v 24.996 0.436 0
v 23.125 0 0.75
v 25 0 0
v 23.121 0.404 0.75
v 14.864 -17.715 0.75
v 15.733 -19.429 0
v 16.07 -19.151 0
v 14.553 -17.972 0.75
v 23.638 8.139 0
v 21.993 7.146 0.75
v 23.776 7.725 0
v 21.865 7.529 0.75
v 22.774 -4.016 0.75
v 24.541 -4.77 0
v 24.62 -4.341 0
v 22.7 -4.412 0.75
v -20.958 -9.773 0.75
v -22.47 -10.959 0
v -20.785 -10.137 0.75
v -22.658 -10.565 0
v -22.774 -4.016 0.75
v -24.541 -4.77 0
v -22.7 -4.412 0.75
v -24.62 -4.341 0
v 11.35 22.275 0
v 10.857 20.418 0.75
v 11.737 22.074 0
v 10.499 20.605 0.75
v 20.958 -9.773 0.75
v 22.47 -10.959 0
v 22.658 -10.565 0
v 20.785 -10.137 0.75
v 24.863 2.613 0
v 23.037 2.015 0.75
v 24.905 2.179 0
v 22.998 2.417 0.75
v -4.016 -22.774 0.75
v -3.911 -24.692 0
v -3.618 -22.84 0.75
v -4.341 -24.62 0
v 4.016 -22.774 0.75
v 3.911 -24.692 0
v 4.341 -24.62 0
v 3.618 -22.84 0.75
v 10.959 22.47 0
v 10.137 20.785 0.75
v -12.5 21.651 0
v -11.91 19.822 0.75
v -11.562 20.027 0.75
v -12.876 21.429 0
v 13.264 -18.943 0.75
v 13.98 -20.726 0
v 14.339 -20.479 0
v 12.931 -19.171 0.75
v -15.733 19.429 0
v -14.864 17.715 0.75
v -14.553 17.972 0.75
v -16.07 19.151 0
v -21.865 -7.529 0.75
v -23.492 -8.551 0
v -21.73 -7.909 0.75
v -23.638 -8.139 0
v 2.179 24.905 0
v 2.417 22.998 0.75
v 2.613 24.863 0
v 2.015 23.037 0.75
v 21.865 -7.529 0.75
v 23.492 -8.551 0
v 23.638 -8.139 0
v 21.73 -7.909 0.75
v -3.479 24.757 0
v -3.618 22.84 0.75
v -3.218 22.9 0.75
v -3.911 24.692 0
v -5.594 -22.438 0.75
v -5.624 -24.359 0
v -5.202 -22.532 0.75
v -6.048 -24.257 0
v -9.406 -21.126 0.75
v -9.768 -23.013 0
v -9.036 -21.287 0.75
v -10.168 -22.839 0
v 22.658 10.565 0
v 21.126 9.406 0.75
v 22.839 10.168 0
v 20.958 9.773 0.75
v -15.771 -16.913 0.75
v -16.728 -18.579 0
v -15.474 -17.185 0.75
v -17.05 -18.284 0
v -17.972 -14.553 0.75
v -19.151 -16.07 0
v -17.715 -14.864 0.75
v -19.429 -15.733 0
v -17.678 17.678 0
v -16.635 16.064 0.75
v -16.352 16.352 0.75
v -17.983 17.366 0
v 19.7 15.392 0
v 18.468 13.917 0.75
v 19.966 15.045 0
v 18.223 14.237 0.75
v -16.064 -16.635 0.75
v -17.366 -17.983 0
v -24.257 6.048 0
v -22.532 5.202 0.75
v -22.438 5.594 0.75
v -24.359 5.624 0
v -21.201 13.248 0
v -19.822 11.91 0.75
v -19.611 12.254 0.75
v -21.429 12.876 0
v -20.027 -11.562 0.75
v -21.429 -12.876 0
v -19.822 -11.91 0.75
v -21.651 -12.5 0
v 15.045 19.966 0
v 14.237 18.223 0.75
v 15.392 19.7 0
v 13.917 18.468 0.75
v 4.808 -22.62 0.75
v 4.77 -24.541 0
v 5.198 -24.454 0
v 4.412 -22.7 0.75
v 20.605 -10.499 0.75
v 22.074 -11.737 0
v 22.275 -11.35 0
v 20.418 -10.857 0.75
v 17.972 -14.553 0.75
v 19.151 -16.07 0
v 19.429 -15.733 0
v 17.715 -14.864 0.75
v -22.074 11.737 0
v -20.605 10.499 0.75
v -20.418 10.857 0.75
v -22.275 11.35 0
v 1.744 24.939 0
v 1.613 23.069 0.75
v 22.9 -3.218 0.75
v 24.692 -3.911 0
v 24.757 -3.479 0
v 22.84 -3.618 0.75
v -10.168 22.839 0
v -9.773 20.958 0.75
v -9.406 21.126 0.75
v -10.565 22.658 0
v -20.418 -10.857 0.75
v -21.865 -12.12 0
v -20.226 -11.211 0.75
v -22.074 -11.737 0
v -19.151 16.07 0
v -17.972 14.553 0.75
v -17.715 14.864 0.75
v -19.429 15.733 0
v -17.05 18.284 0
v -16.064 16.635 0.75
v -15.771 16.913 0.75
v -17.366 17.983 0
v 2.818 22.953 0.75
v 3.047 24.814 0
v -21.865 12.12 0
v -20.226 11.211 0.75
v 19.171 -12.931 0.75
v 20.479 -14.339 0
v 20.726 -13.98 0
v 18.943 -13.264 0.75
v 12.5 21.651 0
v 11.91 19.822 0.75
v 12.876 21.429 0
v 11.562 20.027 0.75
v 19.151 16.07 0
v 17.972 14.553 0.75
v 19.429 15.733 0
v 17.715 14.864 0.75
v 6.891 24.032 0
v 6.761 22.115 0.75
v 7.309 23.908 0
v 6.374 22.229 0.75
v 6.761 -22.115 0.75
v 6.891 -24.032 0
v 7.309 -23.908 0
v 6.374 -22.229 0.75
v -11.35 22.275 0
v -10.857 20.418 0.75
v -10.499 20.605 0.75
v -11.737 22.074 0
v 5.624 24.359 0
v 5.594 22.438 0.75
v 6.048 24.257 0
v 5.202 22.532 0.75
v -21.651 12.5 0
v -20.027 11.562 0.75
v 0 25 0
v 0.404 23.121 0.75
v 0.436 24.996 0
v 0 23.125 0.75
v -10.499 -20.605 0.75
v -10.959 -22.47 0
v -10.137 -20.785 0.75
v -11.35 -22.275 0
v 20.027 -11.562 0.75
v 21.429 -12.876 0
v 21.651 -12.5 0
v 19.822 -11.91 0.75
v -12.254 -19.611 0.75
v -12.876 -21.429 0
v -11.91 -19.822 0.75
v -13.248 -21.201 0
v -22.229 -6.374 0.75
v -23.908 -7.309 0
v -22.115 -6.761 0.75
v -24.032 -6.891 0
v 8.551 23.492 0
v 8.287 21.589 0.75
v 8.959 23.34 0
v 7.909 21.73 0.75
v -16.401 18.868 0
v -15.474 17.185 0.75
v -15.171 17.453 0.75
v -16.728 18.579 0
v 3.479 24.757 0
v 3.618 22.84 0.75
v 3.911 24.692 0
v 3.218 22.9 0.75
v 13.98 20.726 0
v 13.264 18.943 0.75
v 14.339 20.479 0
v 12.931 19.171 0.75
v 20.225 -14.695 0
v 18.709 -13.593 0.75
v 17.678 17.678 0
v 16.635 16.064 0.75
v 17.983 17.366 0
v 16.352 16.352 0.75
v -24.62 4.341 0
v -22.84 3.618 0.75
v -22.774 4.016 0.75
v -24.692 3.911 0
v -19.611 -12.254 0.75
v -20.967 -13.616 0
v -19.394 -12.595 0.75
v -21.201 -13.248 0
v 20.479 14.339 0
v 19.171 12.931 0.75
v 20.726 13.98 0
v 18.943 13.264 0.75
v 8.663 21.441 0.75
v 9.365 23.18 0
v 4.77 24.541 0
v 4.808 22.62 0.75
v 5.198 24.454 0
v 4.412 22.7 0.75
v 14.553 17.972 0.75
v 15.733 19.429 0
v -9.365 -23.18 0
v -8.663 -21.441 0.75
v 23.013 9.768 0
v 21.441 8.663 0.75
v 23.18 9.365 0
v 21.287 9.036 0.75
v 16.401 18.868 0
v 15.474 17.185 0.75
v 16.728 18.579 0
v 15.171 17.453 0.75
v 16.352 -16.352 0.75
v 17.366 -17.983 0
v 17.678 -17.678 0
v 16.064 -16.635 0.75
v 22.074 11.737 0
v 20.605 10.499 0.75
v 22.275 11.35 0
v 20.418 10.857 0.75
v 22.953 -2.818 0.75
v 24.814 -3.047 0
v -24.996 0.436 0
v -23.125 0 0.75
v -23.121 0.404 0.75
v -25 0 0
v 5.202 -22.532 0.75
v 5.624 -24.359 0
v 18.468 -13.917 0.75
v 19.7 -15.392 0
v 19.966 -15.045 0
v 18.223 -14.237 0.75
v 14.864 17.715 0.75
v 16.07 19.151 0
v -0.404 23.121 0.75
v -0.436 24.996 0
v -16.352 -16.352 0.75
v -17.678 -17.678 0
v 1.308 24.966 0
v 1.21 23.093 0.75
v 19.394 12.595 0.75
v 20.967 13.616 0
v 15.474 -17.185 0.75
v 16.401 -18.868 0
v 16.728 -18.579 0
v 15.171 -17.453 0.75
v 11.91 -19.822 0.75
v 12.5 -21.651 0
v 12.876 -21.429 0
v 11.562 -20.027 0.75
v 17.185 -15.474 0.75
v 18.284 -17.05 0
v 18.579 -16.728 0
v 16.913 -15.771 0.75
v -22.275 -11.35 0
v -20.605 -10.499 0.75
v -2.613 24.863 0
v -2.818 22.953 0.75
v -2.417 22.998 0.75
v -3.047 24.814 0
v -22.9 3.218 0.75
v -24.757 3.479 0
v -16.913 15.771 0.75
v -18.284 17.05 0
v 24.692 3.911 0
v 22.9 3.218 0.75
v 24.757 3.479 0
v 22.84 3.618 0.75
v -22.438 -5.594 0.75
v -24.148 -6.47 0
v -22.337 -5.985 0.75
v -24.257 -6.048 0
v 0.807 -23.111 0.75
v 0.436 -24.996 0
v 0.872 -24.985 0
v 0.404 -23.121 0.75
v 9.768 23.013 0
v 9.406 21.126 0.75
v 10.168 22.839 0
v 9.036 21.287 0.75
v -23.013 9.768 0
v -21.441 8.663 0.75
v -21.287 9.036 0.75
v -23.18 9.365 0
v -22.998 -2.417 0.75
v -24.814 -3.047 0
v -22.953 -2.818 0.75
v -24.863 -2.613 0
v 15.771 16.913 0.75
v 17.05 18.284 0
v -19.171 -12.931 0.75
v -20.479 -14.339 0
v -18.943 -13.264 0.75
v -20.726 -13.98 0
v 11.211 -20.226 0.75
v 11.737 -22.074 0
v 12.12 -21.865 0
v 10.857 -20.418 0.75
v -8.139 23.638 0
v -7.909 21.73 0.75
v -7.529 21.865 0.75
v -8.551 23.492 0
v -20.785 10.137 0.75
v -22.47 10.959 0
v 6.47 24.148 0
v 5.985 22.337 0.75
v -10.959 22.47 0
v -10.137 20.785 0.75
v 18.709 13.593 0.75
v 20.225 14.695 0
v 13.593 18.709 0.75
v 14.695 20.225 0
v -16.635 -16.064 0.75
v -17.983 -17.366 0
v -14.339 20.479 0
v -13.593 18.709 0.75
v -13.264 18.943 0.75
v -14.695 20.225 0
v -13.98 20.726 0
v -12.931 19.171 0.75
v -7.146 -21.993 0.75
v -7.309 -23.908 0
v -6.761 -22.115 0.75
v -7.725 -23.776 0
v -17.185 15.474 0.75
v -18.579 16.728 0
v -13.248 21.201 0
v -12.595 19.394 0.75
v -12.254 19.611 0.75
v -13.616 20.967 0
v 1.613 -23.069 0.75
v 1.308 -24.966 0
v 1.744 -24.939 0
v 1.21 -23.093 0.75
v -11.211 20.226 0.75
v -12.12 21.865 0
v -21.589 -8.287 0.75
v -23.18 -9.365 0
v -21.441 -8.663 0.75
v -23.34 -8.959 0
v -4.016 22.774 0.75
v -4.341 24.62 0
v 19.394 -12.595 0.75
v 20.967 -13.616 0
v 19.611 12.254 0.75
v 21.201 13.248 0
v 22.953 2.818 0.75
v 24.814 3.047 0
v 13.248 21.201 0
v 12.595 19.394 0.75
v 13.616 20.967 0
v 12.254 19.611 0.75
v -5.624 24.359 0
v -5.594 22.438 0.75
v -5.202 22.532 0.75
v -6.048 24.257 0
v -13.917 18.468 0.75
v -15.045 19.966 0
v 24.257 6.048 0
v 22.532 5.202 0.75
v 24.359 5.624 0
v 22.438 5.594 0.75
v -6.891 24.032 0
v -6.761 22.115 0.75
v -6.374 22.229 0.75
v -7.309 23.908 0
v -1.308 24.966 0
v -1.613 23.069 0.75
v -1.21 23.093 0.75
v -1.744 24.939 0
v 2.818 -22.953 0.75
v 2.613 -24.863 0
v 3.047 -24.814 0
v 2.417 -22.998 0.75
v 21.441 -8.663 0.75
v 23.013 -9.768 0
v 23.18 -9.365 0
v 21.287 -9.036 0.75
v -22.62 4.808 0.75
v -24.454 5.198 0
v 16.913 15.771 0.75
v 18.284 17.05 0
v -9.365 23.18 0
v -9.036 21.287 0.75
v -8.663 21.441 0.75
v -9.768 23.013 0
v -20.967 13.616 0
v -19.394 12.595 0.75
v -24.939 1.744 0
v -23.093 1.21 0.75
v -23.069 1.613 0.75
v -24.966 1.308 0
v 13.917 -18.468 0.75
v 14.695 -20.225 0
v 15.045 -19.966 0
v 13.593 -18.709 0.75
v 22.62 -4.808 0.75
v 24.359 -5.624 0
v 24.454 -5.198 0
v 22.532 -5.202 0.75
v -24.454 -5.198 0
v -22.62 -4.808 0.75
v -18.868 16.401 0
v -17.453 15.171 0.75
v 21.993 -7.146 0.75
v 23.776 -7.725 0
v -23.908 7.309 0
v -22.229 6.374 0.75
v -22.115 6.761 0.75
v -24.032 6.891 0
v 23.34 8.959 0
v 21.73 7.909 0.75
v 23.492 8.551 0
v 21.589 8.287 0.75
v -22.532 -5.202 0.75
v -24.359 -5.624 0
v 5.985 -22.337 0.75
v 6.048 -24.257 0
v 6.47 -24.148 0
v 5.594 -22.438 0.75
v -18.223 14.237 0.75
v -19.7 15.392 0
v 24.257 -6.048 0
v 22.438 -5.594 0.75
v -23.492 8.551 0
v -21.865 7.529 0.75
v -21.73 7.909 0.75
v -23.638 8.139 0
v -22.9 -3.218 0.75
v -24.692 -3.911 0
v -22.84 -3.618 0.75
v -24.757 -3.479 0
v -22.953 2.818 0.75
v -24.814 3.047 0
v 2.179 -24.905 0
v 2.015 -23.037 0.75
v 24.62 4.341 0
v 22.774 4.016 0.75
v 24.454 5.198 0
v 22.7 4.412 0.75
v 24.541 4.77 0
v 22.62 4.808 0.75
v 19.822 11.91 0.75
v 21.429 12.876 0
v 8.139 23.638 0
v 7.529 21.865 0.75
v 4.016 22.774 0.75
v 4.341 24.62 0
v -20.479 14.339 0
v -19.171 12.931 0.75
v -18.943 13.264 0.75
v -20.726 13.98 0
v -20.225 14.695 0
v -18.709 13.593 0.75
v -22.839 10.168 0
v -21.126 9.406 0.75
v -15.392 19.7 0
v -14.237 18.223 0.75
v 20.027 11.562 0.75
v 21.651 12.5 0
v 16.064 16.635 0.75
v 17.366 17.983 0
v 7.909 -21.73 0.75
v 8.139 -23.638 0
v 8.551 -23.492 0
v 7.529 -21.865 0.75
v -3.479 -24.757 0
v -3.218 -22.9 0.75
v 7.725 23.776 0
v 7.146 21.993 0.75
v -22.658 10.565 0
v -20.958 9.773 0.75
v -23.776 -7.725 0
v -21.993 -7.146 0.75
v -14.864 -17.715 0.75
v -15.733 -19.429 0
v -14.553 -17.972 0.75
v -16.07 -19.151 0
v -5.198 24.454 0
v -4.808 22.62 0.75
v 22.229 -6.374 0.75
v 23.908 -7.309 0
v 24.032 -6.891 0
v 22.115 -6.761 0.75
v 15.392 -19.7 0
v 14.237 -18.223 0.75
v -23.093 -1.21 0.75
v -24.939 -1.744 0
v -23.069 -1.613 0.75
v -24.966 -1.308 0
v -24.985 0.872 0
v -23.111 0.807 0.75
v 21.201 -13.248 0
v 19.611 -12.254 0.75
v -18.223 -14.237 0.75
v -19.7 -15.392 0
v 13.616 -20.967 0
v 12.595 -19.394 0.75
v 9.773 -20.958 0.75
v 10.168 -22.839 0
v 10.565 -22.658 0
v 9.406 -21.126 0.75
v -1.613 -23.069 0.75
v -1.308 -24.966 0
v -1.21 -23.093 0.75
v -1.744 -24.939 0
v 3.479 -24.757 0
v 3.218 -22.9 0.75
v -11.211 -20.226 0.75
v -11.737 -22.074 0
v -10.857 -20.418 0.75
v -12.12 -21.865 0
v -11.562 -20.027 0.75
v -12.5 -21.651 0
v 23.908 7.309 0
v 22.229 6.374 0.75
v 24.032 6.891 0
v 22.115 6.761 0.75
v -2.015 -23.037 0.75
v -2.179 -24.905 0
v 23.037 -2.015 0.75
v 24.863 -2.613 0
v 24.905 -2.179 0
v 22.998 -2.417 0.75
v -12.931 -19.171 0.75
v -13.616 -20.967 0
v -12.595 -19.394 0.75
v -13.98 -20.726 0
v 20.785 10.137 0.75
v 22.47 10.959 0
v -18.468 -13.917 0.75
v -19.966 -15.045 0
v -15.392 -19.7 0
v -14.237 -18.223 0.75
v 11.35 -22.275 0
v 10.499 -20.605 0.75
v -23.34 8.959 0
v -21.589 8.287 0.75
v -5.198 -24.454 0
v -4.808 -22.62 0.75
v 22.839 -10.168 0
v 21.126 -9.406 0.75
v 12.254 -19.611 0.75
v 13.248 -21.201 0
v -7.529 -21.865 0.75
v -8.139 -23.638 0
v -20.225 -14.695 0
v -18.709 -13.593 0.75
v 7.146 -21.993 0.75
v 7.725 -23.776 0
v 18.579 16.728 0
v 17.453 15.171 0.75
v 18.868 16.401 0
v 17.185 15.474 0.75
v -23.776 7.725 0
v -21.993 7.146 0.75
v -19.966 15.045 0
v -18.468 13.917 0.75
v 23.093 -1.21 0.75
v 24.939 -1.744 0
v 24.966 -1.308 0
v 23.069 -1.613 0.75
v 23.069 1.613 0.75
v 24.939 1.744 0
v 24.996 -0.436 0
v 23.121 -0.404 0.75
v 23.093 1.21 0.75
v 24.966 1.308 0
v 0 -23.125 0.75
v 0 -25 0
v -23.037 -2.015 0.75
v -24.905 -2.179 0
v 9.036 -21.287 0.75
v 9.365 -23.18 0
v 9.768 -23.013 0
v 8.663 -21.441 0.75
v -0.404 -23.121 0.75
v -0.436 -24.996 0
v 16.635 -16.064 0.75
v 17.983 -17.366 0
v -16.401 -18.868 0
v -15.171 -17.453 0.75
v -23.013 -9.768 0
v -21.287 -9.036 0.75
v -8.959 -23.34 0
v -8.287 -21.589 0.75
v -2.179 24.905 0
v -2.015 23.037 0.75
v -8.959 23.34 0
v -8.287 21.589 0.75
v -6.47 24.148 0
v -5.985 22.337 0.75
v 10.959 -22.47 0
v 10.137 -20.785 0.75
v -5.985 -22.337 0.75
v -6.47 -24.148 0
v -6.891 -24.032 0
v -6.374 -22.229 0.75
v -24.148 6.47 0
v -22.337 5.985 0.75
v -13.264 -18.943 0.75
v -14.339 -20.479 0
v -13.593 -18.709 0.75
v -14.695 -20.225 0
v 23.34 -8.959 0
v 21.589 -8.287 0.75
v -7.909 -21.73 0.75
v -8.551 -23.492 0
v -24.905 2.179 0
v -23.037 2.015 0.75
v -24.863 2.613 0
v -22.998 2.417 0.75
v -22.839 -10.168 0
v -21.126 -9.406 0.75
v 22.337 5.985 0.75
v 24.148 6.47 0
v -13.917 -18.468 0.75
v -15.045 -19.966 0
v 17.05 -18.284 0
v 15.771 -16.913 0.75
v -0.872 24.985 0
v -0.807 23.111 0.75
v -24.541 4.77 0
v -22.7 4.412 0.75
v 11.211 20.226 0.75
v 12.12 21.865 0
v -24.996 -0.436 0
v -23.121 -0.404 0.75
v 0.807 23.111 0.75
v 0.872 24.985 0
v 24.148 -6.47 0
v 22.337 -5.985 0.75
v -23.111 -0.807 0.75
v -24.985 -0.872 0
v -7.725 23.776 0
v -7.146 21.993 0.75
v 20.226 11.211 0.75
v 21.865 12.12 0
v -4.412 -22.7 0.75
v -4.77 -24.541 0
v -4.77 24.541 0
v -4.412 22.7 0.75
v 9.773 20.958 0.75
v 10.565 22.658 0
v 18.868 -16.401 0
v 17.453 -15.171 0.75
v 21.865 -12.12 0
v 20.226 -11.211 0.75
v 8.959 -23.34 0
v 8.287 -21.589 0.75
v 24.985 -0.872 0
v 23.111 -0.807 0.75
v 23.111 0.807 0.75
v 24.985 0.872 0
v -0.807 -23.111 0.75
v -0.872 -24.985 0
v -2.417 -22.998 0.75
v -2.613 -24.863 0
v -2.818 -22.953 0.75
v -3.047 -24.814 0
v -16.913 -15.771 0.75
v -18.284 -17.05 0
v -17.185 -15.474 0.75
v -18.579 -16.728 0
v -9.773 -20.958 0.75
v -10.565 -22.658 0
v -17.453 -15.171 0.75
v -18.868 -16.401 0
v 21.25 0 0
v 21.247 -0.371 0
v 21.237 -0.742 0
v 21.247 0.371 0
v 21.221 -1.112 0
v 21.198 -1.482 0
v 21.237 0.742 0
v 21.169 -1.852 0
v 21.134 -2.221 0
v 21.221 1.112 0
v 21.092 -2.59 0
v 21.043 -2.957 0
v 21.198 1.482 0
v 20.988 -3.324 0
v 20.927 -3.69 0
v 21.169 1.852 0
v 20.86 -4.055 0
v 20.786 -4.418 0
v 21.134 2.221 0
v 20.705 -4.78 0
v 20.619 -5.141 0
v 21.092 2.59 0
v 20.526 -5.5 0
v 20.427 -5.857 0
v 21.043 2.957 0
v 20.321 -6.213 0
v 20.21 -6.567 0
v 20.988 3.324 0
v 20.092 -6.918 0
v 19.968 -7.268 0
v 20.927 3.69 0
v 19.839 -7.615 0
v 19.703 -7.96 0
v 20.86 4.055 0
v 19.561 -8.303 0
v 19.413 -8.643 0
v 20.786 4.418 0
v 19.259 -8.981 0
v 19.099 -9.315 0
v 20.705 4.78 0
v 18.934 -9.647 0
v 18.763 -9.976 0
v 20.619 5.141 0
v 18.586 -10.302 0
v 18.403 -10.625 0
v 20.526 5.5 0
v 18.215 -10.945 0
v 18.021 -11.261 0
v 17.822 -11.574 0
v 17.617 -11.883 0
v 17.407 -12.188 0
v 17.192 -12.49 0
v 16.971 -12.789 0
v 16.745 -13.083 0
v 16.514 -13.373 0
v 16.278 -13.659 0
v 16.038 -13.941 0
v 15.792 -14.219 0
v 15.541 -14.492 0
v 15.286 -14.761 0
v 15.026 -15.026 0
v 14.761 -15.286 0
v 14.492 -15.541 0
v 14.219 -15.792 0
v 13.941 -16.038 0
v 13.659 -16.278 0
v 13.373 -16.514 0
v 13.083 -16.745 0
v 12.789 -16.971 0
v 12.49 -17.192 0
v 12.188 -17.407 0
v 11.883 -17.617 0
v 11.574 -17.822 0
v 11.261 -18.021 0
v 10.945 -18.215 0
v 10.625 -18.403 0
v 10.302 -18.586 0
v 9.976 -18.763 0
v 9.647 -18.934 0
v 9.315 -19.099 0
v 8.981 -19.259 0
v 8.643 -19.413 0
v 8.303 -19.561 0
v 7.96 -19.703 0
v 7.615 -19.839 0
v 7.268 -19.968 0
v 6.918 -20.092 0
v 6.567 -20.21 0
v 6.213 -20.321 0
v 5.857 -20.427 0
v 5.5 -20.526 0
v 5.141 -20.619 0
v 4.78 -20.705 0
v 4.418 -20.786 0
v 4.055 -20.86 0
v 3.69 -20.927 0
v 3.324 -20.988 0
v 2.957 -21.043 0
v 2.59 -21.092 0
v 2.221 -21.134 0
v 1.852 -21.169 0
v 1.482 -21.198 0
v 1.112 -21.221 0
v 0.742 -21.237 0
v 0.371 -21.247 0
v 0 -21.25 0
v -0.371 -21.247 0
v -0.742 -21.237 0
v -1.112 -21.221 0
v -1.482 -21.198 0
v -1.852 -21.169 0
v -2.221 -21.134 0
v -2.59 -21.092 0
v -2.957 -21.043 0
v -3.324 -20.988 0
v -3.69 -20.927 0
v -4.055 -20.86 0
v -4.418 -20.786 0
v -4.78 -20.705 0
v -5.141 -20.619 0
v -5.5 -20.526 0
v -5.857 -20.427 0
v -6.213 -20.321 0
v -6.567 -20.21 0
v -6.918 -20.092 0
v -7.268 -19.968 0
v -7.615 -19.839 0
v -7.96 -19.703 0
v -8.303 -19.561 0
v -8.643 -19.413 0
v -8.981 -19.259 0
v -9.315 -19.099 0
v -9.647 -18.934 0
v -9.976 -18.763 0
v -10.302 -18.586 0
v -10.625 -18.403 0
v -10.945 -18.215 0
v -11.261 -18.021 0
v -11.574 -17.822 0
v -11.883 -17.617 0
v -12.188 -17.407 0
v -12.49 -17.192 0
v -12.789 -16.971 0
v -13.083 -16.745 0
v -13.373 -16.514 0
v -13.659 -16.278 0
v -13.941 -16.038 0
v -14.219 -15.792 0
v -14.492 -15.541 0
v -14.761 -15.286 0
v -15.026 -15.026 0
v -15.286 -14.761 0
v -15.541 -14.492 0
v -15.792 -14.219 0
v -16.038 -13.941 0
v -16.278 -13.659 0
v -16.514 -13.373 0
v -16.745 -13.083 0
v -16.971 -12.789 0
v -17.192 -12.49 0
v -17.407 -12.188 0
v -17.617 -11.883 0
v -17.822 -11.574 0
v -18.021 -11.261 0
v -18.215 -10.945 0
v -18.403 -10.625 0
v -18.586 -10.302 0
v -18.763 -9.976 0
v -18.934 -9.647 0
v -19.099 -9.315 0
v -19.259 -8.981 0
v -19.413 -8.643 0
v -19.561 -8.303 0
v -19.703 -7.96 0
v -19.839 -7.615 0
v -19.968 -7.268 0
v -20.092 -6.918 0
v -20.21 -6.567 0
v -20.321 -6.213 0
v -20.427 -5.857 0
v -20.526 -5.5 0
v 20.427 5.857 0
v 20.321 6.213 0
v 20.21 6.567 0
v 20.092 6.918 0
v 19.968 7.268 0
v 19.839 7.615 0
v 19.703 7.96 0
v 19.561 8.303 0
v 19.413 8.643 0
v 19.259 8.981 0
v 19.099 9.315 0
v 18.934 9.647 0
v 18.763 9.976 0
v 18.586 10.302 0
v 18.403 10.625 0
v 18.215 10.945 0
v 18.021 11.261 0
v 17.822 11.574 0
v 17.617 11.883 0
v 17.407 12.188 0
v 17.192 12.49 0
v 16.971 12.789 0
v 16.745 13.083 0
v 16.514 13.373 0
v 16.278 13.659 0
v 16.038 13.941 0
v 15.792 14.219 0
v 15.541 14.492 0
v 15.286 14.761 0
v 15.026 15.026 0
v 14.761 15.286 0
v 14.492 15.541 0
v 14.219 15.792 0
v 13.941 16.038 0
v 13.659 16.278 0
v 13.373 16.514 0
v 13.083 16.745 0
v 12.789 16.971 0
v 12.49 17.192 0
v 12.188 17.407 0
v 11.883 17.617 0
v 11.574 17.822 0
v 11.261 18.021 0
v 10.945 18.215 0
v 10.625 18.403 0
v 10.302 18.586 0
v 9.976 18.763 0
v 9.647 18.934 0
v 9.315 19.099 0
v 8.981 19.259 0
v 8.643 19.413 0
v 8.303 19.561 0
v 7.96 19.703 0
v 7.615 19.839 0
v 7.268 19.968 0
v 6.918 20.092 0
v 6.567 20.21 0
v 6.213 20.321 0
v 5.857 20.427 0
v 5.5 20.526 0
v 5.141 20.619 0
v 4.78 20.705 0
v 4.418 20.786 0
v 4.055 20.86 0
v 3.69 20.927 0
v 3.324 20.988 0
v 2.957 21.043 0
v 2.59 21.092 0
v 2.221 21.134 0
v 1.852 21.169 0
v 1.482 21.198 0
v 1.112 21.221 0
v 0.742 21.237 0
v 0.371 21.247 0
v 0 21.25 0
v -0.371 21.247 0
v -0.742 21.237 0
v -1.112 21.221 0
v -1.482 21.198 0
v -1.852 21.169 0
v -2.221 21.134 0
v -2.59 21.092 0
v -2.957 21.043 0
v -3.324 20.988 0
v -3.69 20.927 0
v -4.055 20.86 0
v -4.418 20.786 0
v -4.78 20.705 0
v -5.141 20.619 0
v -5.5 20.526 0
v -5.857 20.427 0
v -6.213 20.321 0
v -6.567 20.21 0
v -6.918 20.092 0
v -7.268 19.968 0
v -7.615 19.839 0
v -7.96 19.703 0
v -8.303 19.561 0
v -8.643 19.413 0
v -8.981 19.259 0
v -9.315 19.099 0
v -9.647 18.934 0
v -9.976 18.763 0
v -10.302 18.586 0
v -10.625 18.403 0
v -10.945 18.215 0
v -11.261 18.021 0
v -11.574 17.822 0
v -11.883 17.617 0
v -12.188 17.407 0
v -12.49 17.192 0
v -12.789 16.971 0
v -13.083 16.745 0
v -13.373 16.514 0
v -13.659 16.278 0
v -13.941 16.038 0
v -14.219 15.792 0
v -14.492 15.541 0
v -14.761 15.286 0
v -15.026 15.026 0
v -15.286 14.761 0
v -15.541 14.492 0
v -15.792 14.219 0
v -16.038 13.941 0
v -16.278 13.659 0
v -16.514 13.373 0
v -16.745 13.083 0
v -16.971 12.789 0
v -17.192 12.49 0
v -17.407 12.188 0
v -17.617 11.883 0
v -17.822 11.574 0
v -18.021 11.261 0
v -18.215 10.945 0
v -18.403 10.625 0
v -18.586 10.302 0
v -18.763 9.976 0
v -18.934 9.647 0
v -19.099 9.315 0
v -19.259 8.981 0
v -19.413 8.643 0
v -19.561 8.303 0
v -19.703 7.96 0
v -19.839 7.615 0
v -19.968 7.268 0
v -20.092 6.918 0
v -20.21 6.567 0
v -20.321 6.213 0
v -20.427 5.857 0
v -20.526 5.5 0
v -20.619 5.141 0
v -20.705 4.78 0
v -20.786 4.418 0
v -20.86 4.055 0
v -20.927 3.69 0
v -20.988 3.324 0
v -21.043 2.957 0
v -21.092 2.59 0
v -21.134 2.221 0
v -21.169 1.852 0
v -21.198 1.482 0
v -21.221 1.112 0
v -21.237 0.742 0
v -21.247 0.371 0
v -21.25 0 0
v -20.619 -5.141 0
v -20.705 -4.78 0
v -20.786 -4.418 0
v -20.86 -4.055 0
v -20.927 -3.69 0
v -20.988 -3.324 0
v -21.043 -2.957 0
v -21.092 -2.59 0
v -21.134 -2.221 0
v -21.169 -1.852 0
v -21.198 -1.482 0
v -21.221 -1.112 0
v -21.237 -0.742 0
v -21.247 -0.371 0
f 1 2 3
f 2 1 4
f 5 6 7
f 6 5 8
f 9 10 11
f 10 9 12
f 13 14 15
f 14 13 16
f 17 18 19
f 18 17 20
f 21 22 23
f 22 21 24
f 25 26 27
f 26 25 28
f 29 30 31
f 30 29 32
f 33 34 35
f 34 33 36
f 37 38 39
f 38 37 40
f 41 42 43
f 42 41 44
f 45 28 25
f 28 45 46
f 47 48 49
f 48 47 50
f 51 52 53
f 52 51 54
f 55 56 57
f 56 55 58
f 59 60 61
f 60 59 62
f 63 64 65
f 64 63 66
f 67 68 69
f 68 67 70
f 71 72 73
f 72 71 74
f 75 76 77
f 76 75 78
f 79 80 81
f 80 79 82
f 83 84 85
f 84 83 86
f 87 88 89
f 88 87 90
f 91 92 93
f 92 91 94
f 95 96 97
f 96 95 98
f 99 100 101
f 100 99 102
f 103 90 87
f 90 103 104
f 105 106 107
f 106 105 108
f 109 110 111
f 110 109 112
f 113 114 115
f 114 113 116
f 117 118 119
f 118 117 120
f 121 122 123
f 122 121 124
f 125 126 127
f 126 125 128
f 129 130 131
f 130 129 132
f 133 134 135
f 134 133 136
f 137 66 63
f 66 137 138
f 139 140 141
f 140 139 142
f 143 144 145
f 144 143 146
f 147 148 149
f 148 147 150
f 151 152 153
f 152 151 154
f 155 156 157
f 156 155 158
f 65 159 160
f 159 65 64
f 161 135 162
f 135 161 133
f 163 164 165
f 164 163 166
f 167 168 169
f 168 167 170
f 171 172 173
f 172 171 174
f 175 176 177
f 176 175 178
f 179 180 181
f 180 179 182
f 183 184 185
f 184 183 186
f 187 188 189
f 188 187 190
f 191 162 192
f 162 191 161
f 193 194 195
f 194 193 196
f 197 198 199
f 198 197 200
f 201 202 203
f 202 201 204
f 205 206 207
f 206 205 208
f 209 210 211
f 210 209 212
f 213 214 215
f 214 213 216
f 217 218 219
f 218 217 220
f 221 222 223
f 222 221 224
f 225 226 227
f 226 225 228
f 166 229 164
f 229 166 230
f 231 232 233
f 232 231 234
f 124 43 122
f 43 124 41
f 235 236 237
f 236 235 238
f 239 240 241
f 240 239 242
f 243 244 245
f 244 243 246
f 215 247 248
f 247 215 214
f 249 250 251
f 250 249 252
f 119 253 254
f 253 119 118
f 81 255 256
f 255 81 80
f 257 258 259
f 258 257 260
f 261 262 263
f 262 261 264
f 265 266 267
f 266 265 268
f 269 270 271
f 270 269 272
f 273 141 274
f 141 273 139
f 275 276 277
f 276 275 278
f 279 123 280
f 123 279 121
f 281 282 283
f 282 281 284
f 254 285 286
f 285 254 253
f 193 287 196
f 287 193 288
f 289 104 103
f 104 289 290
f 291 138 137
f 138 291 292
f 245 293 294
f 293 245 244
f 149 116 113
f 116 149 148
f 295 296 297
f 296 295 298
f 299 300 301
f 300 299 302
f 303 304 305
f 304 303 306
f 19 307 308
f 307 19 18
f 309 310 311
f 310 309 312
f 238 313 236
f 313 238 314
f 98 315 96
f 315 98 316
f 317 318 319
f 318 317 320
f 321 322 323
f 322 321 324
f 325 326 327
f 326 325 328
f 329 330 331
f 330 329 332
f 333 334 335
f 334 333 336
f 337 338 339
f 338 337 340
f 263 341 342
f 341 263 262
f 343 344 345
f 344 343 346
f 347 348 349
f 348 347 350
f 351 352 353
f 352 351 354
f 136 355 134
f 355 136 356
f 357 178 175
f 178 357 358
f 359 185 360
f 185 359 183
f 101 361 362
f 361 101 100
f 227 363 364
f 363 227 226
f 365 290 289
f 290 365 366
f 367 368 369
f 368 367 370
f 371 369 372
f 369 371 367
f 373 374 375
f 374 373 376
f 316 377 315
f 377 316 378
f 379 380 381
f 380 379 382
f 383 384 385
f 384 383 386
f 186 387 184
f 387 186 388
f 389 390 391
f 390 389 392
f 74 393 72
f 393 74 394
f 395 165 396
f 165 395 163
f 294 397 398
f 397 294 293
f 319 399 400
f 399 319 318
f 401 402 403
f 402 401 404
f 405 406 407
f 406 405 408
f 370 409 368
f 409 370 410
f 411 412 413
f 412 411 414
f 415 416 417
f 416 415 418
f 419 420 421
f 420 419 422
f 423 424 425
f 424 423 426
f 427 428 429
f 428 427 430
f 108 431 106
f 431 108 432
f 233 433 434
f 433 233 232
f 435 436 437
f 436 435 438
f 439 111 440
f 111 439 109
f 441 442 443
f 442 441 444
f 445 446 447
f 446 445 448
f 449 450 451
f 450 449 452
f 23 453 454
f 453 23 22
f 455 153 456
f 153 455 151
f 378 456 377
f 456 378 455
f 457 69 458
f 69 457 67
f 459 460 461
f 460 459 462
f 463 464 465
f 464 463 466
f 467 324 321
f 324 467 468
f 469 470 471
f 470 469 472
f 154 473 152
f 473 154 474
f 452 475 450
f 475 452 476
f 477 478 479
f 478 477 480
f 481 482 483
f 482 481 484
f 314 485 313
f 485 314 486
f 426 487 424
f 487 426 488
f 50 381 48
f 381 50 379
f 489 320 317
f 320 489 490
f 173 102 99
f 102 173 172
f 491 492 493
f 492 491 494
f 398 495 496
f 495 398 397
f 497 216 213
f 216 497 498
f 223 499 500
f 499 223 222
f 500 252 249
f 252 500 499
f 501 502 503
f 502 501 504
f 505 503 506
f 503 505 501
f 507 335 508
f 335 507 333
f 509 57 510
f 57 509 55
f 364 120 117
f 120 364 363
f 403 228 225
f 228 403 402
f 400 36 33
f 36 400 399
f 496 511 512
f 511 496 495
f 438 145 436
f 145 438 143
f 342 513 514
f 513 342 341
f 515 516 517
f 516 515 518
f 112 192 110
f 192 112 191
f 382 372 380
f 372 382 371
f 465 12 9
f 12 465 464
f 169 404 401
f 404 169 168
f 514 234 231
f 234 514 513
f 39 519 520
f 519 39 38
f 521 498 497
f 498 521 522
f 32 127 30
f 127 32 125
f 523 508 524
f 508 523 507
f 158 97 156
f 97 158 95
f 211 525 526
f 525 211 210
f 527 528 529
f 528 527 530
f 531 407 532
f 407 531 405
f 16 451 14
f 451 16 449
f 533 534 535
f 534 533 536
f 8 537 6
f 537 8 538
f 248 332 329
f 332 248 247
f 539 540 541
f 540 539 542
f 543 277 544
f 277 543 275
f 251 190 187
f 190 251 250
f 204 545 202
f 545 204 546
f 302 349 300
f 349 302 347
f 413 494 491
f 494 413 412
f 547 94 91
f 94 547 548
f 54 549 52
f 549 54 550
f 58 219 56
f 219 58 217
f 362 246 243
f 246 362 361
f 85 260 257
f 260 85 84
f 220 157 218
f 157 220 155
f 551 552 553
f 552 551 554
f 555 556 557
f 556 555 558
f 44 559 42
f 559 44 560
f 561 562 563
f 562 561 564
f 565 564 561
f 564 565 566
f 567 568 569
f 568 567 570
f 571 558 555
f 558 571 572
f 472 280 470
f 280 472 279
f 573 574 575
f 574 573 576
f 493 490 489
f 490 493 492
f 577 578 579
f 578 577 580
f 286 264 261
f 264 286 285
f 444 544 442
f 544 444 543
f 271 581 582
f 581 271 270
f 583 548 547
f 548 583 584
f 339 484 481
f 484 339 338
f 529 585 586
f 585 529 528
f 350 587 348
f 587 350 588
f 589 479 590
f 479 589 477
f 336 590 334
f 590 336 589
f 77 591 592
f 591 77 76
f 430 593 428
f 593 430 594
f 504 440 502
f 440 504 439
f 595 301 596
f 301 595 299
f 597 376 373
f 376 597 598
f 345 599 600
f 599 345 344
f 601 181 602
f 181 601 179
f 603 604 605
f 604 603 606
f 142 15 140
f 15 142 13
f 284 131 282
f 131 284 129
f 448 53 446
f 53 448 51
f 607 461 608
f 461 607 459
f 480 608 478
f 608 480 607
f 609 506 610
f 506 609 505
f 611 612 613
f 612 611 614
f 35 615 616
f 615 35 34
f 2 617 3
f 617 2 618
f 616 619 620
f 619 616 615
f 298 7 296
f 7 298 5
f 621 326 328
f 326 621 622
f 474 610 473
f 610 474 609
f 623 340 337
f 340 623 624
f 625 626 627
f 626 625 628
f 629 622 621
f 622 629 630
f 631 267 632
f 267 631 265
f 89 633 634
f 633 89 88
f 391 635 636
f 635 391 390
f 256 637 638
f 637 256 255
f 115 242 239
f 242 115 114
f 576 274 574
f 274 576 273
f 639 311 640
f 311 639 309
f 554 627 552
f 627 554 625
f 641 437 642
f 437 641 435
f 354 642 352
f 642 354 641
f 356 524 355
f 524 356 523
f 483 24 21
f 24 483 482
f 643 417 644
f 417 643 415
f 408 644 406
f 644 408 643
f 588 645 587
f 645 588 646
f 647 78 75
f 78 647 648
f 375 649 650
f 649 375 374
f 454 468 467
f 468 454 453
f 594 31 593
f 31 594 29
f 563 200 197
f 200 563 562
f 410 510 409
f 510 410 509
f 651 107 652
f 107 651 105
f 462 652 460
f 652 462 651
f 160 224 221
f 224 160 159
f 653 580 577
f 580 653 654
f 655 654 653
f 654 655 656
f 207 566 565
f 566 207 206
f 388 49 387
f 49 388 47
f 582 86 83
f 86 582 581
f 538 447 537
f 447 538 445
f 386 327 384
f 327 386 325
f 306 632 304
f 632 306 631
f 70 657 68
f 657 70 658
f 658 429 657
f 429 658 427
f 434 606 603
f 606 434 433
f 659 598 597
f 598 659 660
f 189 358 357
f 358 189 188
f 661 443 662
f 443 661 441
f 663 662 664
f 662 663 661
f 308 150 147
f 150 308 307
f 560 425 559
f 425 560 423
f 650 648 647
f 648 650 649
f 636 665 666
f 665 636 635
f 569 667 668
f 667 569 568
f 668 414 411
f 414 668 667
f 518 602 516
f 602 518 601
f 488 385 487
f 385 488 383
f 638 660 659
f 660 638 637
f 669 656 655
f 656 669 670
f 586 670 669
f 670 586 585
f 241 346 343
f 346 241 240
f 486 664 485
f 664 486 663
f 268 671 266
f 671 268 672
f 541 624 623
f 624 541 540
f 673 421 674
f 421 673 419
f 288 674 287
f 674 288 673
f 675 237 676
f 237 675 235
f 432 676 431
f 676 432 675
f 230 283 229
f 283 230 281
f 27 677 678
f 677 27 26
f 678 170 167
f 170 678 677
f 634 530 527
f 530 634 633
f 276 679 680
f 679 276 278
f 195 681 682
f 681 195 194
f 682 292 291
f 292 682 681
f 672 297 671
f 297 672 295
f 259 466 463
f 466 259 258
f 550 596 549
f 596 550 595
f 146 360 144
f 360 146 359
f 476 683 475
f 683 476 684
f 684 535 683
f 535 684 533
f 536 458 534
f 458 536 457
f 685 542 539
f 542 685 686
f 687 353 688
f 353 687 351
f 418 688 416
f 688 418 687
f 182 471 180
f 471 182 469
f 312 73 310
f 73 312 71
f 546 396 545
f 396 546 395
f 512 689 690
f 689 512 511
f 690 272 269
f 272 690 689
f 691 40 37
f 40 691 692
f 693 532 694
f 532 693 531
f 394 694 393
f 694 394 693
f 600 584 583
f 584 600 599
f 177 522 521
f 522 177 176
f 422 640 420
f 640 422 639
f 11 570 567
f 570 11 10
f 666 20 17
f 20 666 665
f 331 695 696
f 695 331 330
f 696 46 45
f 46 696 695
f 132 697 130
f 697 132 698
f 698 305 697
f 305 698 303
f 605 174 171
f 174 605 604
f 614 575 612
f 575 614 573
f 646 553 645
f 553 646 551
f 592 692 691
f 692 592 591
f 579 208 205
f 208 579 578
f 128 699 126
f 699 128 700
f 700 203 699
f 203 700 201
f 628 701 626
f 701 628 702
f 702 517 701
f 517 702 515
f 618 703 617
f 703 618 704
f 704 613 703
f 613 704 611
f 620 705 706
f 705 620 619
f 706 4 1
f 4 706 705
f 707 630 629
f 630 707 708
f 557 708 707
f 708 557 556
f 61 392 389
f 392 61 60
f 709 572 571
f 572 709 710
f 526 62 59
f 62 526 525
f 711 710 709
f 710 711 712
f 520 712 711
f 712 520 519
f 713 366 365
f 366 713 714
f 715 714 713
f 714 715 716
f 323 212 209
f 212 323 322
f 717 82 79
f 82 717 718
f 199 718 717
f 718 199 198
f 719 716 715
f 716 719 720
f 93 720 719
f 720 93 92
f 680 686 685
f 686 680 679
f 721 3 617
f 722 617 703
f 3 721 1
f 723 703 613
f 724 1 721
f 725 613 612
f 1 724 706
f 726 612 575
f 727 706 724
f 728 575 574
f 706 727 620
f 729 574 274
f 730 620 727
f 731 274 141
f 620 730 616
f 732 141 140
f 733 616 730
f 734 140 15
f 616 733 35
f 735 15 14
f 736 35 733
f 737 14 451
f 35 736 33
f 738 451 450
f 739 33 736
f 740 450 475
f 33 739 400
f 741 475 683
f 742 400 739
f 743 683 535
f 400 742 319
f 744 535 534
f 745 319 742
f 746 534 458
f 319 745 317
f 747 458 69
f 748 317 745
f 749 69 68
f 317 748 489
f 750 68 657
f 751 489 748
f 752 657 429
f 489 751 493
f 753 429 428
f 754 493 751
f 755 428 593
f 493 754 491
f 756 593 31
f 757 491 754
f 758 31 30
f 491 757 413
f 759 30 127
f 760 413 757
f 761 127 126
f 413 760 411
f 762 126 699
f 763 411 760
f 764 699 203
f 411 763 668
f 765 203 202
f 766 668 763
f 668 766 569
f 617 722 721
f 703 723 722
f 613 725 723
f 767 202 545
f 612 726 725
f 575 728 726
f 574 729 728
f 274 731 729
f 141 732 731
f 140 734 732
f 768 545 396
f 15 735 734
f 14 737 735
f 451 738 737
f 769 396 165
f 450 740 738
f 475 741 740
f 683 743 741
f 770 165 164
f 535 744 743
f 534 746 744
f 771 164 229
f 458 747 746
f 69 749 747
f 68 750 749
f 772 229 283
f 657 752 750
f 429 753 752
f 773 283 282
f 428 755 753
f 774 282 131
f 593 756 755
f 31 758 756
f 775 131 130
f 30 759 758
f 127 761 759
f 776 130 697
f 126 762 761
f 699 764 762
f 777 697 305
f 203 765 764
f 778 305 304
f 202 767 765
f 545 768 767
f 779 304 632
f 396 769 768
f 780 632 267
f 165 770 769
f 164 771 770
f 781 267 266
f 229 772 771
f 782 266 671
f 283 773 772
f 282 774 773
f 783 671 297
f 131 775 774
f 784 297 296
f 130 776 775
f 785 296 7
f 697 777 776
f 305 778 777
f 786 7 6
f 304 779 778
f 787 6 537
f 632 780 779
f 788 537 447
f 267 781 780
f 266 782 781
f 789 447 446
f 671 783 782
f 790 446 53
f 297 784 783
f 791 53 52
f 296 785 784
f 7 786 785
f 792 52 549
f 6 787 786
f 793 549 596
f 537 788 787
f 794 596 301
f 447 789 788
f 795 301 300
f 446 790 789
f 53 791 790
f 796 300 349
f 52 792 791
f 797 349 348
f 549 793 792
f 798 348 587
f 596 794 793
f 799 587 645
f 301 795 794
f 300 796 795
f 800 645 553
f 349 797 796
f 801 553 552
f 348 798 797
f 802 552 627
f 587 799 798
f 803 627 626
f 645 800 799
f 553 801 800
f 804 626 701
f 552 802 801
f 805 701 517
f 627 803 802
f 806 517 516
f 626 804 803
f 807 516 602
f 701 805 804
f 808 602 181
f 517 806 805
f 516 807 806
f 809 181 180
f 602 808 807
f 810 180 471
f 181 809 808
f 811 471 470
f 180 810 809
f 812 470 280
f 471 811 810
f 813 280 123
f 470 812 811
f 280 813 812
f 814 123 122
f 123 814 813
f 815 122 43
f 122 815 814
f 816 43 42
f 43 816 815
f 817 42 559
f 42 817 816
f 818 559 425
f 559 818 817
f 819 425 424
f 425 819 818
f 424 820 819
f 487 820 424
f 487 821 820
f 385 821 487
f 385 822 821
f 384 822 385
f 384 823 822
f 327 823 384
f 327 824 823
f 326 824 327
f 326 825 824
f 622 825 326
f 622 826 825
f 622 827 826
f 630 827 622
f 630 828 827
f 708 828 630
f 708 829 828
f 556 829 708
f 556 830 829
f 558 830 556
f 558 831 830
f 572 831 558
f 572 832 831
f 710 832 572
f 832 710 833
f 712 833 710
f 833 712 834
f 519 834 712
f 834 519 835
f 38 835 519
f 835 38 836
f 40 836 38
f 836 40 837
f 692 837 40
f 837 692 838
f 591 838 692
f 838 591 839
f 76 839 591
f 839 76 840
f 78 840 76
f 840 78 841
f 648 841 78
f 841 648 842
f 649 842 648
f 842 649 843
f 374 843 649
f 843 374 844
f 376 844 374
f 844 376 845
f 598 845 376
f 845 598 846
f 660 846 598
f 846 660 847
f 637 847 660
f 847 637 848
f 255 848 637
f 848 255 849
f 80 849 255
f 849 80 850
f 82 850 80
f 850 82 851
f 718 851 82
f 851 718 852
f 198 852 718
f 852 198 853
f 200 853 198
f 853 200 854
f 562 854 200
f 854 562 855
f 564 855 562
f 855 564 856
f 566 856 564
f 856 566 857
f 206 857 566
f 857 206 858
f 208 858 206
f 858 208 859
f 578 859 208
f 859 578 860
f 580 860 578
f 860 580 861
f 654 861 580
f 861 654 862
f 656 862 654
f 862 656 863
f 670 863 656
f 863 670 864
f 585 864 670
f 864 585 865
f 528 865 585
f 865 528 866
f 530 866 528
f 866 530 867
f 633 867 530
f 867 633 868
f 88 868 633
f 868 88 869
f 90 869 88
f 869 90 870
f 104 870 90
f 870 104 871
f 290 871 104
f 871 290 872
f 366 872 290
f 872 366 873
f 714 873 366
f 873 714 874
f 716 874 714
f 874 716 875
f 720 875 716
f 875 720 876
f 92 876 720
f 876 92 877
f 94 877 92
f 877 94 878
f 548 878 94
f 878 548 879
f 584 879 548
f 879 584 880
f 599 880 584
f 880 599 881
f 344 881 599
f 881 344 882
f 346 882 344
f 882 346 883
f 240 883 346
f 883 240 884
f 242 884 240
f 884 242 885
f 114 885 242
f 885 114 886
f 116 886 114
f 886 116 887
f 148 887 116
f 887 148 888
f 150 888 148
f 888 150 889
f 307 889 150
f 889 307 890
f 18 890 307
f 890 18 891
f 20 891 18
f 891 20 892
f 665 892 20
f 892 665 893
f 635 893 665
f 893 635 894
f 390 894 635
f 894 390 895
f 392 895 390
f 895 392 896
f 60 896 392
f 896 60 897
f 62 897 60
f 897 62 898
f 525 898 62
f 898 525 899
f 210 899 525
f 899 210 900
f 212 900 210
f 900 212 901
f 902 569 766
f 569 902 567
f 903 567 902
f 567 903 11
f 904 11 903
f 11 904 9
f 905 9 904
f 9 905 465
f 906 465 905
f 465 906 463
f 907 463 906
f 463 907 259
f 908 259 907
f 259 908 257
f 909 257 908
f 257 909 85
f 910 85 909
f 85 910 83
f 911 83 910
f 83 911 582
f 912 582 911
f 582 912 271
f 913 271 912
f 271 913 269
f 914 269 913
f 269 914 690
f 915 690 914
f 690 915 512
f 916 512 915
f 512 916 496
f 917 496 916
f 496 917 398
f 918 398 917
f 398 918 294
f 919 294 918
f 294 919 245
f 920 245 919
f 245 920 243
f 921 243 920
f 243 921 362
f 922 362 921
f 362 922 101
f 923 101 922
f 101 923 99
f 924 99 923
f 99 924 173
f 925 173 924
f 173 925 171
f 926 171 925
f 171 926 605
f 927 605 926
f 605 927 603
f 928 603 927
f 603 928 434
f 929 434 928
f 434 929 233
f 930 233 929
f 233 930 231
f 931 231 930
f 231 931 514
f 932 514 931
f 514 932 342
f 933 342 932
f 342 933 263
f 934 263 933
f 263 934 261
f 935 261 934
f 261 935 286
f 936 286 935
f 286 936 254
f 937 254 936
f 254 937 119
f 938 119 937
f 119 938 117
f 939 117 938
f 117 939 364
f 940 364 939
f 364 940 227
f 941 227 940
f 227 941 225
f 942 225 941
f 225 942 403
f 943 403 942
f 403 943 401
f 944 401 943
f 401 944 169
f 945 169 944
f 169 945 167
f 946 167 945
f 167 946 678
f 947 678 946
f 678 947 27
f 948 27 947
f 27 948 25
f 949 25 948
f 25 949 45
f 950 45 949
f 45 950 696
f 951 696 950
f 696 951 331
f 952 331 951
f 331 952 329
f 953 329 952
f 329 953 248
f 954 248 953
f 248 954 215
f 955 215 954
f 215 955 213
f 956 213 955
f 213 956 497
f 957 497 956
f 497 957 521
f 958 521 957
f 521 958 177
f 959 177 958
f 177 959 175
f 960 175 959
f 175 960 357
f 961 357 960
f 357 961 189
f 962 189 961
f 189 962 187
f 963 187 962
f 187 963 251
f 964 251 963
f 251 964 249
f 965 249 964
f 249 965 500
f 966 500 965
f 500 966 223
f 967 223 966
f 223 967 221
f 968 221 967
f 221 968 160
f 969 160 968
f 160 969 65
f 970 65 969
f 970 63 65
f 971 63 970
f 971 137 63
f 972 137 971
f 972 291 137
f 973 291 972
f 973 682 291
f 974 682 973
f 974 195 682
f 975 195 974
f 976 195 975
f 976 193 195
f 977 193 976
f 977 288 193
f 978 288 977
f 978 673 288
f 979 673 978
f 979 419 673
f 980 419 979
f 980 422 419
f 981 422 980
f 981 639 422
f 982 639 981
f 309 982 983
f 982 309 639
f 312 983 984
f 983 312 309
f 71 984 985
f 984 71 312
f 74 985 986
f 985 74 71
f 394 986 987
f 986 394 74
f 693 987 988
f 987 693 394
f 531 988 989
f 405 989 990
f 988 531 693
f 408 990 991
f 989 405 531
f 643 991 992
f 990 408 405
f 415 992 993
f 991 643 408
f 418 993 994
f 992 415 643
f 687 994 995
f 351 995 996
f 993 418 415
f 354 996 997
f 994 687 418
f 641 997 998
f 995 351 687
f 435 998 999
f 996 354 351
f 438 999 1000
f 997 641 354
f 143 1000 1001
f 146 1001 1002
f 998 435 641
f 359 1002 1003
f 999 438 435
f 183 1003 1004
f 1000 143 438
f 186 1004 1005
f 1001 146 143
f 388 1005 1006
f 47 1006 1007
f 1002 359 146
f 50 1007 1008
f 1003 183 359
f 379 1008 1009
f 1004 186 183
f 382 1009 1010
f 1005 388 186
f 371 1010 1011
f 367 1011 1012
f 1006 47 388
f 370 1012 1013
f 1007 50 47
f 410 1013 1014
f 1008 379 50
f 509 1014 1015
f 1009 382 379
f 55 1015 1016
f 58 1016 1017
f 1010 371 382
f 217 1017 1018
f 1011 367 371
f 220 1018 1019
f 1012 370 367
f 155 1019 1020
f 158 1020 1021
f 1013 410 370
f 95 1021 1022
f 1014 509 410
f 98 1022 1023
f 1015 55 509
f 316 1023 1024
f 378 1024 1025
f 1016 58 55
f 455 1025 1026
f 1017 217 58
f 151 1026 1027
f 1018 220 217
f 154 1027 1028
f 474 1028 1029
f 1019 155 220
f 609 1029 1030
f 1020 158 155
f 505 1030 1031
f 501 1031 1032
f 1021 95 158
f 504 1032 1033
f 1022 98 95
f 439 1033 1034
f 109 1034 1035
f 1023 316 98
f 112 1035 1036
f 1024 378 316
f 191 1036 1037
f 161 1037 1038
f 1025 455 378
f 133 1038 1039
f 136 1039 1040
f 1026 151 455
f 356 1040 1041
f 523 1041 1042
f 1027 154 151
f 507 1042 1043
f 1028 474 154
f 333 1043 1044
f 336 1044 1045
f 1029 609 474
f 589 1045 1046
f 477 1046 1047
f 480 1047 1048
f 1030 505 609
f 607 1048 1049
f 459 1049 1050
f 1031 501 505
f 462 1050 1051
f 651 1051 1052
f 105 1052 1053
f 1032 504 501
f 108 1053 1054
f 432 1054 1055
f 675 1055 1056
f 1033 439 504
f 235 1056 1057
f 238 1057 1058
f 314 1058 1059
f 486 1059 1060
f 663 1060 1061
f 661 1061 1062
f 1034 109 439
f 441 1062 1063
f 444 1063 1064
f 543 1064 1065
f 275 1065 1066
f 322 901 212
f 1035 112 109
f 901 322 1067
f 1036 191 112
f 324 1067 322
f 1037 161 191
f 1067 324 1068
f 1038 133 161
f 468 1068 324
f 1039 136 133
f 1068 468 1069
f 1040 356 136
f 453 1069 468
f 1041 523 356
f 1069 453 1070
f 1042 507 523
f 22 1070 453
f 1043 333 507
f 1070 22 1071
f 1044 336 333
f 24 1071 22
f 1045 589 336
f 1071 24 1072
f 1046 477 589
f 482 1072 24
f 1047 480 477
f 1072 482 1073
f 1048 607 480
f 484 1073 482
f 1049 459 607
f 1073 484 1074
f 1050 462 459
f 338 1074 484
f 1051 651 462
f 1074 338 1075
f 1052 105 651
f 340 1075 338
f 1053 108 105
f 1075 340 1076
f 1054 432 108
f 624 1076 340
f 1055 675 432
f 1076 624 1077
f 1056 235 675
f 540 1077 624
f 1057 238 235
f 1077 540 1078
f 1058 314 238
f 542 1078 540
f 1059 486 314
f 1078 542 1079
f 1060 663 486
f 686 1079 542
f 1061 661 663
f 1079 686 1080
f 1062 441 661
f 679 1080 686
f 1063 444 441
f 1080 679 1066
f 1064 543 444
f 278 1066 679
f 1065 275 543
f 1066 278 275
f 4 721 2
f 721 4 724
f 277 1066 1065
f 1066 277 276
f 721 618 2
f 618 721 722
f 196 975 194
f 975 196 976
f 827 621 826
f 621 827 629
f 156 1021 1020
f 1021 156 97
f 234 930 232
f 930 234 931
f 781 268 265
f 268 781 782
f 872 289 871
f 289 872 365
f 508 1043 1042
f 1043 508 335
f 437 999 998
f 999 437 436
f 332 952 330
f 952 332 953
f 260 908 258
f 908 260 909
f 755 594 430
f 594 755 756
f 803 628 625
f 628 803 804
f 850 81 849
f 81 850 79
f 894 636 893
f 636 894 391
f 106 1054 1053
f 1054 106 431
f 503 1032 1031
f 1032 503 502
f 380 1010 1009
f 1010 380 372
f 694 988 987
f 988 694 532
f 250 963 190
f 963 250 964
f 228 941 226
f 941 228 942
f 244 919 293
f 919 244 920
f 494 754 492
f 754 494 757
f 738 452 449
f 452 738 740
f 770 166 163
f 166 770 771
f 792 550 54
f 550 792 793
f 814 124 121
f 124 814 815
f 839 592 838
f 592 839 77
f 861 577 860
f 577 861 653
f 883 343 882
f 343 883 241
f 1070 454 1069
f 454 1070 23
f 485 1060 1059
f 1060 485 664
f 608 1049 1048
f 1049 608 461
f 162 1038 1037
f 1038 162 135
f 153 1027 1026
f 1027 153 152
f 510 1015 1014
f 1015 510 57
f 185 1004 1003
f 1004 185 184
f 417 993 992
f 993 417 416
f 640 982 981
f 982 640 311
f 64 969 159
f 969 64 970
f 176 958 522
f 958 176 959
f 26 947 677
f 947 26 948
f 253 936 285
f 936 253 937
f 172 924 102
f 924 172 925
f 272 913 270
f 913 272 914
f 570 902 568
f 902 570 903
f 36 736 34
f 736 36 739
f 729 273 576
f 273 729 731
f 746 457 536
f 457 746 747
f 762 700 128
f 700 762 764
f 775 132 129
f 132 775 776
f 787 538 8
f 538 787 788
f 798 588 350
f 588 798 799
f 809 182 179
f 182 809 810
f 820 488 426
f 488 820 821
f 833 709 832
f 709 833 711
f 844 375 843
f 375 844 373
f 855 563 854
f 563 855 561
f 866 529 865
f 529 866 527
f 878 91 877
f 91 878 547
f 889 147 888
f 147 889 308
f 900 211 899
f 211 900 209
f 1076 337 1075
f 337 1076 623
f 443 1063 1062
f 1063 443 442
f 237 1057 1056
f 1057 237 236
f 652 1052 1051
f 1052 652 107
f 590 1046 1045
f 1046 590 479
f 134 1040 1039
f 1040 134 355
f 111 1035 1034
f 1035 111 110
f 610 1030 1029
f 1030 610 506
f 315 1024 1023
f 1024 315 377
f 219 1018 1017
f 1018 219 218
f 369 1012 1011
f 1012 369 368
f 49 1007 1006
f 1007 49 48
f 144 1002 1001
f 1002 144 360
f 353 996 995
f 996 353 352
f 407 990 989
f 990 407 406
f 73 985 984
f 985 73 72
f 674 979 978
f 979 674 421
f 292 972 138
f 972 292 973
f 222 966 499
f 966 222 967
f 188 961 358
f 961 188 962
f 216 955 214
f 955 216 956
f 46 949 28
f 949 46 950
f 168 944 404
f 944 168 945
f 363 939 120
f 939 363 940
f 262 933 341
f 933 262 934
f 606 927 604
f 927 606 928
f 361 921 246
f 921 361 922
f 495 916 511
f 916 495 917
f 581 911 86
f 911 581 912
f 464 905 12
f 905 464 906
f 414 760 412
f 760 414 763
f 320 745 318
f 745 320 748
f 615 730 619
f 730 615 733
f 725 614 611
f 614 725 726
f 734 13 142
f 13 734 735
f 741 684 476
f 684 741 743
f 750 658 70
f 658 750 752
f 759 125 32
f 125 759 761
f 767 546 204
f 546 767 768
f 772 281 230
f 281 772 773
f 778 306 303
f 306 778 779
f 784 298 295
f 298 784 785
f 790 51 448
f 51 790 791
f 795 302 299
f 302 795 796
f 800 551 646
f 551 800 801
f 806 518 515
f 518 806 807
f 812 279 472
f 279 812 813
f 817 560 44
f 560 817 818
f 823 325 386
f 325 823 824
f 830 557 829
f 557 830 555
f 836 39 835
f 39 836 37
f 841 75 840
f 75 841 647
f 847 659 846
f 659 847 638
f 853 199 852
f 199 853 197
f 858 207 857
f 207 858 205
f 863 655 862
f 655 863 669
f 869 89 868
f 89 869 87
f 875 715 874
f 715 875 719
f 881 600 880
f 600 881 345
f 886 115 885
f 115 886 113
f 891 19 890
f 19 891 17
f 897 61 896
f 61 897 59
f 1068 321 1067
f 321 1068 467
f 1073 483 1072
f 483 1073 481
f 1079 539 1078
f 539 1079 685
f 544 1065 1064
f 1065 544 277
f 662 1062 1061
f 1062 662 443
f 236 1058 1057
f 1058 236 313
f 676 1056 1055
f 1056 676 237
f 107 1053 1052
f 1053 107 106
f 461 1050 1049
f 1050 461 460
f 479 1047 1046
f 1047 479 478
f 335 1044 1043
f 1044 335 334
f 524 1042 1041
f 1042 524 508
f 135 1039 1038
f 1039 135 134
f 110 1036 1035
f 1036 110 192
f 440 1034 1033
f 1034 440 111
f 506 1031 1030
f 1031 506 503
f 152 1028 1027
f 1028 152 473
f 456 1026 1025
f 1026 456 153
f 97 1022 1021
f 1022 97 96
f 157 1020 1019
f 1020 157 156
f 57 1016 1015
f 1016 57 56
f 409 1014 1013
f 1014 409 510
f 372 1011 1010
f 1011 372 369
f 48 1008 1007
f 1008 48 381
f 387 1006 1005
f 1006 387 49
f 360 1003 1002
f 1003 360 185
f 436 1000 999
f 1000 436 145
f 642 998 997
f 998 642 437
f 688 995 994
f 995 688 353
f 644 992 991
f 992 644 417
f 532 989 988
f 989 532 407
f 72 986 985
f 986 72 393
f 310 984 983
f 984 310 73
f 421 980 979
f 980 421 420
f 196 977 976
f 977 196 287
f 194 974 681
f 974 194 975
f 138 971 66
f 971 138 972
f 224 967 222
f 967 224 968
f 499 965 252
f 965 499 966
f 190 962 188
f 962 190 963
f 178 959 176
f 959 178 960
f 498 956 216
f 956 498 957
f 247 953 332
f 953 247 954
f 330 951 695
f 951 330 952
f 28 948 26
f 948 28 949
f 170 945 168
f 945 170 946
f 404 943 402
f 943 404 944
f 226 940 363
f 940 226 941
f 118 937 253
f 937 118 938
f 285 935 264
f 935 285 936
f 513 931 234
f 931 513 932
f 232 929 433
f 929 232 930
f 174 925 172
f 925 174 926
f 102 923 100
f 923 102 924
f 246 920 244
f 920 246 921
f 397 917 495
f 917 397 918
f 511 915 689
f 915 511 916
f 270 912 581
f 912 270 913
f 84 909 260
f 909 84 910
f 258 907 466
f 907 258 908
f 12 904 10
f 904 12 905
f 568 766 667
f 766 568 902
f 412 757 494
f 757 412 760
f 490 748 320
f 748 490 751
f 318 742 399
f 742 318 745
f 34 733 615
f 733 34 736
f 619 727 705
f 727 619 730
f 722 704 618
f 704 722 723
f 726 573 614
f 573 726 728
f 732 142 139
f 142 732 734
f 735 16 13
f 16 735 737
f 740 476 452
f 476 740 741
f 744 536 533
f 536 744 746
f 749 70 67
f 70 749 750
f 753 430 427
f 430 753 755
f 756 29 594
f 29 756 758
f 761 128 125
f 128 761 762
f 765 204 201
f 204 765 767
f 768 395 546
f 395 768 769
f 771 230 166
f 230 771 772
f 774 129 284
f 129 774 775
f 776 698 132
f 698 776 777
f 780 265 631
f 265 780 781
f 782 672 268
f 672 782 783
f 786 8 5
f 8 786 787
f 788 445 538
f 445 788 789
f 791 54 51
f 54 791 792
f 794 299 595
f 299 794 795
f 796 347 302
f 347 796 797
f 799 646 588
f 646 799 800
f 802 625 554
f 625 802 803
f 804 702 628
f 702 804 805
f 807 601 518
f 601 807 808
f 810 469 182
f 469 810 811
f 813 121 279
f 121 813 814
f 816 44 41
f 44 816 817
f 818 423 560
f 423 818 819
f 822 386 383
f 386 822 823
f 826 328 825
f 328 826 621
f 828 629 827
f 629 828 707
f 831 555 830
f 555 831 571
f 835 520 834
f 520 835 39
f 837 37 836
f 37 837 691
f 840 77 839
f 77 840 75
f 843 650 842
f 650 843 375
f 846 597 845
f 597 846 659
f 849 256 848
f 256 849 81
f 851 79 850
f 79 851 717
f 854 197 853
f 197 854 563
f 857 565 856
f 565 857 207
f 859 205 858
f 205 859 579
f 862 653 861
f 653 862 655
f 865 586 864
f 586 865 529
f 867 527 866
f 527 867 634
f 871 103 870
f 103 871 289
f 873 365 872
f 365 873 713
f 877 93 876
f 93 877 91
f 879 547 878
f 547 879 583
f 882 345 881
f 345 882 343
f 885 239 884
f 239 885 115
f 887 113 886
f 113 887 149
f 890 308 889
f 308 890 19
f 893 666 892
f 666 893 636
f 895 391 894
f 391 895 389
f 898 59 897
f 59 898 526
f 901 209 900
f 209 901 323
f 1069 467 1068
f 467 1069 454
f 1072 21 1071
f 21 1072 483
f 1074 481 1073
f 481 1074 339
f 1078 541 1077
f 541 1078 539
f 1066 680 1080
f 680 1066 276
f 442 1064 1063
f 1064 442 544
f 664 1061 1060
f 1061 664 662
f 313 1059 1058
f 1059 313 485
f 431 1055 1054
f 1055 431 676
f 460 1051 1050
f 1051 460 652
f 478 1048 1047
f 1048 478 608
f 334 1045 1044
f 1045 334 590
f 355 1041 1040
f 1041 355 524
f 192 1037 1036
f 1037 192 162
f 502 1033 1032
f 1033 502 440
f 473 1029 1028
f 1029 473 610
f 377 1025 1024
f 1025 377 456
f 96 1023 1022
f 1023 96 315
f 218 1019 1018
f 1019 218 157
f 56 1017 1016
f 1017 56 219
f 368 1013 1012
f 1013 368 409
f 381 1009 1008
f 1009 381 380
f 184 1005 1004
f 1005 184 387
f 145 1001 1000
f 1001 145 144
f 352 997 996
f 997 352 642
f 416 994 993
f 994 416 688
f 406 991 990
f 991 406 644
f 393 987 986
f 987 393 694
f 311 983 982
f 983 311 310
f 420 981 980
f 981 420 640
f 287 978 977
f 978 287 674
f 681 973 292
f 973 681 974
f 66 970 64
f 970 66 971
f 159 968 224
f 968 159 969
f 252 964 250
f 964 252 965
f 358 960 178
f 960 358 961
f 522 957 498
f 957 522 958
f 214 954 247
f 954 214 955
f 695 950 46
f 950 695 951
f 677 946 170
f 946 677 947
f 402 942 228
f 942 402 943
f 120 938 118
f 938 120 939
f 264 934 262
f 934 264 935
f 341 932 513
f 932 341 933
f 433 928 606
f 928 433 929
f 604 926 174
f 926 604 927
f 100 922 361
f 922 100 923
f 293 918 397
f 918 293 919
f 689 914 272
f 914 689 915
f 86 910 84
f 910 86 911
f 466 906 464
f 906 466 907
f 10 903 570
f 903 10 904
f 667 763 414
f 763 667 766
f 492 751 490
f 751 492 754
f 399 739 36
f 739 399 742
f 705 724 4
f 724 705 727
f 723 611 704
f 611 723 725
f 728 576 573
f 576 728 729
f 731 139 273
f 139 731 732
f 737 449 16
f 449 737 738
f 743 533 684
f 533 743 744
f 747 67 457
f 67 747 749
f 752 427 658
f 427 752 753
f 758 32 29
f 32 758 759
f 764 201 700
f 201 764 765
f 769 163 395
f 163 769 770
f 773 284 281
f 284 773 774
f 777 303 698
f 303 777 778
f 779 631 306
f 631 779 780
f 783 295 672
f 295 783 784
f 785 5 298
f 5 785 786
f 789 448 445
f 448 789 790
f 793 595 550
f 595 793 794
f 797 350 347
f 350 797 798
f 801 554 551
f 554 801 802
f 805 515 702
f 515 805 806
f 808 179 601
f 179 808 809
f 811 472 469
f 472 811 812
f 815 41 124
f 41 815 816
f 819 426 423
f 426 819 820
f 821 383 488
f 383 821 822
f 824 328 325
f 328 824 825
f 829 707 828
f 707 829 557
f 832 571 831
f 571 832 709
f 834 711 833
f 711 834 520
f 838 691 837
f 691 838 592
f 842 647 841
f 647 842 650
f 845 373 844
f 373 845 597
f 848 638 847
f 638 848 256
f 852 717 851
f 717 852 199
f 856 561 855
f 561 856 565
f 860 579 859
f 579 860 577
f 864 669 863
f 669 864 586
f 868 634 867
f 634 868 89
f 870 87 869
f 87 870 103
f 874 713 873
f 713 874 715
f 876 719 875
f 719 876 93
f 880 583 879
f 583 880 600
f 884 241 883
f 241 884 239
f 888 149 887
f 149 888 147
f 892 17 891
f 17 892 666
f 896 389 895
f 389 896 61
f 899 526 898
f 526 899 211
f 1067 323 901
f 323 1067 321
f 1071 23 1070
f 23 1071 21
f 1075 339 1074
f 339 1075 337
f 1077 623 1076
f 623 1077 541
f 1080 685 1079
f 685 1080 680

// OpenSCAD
$fn = 360;

difference() {
    cylinder(r1=25, r2=0, h=10);
    translate([0, 0, -8.5]) {
        cylinder(r1=0, r2=25, h=10);
    }
    translate([0, 0, 1]) {
        cylinder(r=25, h=10);
    }
}
